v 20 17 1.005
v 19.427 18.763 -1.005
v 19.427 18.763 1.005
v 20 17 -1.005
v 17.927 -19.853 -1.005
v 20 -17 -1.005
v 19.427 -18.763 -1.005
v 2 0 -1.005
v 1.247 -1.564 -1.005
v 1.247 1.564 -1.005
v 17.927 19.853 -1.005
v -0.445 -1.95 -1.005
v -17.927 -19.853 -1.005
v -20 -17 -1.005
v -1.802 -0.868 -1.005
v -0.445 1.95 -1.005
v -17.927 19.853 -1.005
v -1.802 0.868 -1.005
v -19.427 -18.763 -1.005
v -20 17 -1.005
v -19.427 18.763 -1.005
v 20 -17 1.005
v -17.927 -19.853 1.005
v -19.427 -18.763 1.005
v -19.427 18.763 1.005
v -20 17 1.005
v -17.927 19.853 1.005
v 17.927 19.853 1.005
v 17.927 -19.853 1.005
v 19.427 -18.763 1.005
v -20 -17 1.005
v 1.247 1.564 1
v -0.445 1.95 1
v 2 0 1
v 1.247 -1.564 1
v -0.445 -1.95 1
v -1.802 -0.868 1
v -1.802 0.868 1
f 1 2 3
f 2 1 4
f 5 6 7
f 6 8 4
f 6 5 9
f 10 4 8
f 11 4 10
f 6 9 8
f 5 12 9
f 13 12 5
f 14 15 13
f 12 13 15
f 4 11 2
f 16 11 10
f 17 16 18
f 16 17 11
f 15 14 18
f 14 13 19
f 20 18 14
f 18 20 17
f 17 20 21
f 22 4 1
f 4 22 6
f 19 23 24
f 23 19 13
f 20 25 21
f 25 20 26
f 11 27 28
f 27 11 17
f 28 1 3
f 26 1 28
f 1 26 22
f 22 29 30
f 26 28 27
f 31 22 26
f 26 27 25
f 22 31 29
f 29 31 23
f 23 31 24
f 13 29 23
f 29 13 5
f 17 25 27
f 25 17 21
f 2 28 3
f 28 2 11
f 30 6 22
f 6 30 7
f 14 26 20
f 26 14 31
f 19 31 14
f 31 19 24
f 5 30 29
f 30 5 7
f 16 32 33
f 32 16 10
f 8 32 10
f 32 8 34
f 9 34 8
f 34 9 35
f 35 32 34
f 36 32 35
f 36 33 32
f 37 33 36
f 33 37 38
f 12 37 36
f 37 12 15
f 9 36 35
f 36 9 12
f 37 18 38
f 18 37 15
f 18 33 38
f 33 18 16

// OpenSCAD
// Parameters
plate_size = 40;         // Length and width of the square plate
plate_thickness = 2;     // Thickness of the plate
hole_diameter = 4;       // Diameter of the central hole
corner_radius = 3;       // Radius for rounded corners

// Module to create a square plate with rounded corners
module rounded_square_plate(size, thickness, radius, hole_d) {
    difference() {
        // Rounded square plate
        minkowski() {
            cube([size - 2*radius, size - 2*radius, thickness], center=true);
            cylinder(r=radius, h=0.01, center=true);
        }
        // Central hole
        translate([0, 0, -1])
            cylinder(d=hole_d, h=thickness + 2, center=true);
    }
}

// Render the plate
rounded_square_plate(plate_size, plate_thickness, corner_radius, hole_diameter);
